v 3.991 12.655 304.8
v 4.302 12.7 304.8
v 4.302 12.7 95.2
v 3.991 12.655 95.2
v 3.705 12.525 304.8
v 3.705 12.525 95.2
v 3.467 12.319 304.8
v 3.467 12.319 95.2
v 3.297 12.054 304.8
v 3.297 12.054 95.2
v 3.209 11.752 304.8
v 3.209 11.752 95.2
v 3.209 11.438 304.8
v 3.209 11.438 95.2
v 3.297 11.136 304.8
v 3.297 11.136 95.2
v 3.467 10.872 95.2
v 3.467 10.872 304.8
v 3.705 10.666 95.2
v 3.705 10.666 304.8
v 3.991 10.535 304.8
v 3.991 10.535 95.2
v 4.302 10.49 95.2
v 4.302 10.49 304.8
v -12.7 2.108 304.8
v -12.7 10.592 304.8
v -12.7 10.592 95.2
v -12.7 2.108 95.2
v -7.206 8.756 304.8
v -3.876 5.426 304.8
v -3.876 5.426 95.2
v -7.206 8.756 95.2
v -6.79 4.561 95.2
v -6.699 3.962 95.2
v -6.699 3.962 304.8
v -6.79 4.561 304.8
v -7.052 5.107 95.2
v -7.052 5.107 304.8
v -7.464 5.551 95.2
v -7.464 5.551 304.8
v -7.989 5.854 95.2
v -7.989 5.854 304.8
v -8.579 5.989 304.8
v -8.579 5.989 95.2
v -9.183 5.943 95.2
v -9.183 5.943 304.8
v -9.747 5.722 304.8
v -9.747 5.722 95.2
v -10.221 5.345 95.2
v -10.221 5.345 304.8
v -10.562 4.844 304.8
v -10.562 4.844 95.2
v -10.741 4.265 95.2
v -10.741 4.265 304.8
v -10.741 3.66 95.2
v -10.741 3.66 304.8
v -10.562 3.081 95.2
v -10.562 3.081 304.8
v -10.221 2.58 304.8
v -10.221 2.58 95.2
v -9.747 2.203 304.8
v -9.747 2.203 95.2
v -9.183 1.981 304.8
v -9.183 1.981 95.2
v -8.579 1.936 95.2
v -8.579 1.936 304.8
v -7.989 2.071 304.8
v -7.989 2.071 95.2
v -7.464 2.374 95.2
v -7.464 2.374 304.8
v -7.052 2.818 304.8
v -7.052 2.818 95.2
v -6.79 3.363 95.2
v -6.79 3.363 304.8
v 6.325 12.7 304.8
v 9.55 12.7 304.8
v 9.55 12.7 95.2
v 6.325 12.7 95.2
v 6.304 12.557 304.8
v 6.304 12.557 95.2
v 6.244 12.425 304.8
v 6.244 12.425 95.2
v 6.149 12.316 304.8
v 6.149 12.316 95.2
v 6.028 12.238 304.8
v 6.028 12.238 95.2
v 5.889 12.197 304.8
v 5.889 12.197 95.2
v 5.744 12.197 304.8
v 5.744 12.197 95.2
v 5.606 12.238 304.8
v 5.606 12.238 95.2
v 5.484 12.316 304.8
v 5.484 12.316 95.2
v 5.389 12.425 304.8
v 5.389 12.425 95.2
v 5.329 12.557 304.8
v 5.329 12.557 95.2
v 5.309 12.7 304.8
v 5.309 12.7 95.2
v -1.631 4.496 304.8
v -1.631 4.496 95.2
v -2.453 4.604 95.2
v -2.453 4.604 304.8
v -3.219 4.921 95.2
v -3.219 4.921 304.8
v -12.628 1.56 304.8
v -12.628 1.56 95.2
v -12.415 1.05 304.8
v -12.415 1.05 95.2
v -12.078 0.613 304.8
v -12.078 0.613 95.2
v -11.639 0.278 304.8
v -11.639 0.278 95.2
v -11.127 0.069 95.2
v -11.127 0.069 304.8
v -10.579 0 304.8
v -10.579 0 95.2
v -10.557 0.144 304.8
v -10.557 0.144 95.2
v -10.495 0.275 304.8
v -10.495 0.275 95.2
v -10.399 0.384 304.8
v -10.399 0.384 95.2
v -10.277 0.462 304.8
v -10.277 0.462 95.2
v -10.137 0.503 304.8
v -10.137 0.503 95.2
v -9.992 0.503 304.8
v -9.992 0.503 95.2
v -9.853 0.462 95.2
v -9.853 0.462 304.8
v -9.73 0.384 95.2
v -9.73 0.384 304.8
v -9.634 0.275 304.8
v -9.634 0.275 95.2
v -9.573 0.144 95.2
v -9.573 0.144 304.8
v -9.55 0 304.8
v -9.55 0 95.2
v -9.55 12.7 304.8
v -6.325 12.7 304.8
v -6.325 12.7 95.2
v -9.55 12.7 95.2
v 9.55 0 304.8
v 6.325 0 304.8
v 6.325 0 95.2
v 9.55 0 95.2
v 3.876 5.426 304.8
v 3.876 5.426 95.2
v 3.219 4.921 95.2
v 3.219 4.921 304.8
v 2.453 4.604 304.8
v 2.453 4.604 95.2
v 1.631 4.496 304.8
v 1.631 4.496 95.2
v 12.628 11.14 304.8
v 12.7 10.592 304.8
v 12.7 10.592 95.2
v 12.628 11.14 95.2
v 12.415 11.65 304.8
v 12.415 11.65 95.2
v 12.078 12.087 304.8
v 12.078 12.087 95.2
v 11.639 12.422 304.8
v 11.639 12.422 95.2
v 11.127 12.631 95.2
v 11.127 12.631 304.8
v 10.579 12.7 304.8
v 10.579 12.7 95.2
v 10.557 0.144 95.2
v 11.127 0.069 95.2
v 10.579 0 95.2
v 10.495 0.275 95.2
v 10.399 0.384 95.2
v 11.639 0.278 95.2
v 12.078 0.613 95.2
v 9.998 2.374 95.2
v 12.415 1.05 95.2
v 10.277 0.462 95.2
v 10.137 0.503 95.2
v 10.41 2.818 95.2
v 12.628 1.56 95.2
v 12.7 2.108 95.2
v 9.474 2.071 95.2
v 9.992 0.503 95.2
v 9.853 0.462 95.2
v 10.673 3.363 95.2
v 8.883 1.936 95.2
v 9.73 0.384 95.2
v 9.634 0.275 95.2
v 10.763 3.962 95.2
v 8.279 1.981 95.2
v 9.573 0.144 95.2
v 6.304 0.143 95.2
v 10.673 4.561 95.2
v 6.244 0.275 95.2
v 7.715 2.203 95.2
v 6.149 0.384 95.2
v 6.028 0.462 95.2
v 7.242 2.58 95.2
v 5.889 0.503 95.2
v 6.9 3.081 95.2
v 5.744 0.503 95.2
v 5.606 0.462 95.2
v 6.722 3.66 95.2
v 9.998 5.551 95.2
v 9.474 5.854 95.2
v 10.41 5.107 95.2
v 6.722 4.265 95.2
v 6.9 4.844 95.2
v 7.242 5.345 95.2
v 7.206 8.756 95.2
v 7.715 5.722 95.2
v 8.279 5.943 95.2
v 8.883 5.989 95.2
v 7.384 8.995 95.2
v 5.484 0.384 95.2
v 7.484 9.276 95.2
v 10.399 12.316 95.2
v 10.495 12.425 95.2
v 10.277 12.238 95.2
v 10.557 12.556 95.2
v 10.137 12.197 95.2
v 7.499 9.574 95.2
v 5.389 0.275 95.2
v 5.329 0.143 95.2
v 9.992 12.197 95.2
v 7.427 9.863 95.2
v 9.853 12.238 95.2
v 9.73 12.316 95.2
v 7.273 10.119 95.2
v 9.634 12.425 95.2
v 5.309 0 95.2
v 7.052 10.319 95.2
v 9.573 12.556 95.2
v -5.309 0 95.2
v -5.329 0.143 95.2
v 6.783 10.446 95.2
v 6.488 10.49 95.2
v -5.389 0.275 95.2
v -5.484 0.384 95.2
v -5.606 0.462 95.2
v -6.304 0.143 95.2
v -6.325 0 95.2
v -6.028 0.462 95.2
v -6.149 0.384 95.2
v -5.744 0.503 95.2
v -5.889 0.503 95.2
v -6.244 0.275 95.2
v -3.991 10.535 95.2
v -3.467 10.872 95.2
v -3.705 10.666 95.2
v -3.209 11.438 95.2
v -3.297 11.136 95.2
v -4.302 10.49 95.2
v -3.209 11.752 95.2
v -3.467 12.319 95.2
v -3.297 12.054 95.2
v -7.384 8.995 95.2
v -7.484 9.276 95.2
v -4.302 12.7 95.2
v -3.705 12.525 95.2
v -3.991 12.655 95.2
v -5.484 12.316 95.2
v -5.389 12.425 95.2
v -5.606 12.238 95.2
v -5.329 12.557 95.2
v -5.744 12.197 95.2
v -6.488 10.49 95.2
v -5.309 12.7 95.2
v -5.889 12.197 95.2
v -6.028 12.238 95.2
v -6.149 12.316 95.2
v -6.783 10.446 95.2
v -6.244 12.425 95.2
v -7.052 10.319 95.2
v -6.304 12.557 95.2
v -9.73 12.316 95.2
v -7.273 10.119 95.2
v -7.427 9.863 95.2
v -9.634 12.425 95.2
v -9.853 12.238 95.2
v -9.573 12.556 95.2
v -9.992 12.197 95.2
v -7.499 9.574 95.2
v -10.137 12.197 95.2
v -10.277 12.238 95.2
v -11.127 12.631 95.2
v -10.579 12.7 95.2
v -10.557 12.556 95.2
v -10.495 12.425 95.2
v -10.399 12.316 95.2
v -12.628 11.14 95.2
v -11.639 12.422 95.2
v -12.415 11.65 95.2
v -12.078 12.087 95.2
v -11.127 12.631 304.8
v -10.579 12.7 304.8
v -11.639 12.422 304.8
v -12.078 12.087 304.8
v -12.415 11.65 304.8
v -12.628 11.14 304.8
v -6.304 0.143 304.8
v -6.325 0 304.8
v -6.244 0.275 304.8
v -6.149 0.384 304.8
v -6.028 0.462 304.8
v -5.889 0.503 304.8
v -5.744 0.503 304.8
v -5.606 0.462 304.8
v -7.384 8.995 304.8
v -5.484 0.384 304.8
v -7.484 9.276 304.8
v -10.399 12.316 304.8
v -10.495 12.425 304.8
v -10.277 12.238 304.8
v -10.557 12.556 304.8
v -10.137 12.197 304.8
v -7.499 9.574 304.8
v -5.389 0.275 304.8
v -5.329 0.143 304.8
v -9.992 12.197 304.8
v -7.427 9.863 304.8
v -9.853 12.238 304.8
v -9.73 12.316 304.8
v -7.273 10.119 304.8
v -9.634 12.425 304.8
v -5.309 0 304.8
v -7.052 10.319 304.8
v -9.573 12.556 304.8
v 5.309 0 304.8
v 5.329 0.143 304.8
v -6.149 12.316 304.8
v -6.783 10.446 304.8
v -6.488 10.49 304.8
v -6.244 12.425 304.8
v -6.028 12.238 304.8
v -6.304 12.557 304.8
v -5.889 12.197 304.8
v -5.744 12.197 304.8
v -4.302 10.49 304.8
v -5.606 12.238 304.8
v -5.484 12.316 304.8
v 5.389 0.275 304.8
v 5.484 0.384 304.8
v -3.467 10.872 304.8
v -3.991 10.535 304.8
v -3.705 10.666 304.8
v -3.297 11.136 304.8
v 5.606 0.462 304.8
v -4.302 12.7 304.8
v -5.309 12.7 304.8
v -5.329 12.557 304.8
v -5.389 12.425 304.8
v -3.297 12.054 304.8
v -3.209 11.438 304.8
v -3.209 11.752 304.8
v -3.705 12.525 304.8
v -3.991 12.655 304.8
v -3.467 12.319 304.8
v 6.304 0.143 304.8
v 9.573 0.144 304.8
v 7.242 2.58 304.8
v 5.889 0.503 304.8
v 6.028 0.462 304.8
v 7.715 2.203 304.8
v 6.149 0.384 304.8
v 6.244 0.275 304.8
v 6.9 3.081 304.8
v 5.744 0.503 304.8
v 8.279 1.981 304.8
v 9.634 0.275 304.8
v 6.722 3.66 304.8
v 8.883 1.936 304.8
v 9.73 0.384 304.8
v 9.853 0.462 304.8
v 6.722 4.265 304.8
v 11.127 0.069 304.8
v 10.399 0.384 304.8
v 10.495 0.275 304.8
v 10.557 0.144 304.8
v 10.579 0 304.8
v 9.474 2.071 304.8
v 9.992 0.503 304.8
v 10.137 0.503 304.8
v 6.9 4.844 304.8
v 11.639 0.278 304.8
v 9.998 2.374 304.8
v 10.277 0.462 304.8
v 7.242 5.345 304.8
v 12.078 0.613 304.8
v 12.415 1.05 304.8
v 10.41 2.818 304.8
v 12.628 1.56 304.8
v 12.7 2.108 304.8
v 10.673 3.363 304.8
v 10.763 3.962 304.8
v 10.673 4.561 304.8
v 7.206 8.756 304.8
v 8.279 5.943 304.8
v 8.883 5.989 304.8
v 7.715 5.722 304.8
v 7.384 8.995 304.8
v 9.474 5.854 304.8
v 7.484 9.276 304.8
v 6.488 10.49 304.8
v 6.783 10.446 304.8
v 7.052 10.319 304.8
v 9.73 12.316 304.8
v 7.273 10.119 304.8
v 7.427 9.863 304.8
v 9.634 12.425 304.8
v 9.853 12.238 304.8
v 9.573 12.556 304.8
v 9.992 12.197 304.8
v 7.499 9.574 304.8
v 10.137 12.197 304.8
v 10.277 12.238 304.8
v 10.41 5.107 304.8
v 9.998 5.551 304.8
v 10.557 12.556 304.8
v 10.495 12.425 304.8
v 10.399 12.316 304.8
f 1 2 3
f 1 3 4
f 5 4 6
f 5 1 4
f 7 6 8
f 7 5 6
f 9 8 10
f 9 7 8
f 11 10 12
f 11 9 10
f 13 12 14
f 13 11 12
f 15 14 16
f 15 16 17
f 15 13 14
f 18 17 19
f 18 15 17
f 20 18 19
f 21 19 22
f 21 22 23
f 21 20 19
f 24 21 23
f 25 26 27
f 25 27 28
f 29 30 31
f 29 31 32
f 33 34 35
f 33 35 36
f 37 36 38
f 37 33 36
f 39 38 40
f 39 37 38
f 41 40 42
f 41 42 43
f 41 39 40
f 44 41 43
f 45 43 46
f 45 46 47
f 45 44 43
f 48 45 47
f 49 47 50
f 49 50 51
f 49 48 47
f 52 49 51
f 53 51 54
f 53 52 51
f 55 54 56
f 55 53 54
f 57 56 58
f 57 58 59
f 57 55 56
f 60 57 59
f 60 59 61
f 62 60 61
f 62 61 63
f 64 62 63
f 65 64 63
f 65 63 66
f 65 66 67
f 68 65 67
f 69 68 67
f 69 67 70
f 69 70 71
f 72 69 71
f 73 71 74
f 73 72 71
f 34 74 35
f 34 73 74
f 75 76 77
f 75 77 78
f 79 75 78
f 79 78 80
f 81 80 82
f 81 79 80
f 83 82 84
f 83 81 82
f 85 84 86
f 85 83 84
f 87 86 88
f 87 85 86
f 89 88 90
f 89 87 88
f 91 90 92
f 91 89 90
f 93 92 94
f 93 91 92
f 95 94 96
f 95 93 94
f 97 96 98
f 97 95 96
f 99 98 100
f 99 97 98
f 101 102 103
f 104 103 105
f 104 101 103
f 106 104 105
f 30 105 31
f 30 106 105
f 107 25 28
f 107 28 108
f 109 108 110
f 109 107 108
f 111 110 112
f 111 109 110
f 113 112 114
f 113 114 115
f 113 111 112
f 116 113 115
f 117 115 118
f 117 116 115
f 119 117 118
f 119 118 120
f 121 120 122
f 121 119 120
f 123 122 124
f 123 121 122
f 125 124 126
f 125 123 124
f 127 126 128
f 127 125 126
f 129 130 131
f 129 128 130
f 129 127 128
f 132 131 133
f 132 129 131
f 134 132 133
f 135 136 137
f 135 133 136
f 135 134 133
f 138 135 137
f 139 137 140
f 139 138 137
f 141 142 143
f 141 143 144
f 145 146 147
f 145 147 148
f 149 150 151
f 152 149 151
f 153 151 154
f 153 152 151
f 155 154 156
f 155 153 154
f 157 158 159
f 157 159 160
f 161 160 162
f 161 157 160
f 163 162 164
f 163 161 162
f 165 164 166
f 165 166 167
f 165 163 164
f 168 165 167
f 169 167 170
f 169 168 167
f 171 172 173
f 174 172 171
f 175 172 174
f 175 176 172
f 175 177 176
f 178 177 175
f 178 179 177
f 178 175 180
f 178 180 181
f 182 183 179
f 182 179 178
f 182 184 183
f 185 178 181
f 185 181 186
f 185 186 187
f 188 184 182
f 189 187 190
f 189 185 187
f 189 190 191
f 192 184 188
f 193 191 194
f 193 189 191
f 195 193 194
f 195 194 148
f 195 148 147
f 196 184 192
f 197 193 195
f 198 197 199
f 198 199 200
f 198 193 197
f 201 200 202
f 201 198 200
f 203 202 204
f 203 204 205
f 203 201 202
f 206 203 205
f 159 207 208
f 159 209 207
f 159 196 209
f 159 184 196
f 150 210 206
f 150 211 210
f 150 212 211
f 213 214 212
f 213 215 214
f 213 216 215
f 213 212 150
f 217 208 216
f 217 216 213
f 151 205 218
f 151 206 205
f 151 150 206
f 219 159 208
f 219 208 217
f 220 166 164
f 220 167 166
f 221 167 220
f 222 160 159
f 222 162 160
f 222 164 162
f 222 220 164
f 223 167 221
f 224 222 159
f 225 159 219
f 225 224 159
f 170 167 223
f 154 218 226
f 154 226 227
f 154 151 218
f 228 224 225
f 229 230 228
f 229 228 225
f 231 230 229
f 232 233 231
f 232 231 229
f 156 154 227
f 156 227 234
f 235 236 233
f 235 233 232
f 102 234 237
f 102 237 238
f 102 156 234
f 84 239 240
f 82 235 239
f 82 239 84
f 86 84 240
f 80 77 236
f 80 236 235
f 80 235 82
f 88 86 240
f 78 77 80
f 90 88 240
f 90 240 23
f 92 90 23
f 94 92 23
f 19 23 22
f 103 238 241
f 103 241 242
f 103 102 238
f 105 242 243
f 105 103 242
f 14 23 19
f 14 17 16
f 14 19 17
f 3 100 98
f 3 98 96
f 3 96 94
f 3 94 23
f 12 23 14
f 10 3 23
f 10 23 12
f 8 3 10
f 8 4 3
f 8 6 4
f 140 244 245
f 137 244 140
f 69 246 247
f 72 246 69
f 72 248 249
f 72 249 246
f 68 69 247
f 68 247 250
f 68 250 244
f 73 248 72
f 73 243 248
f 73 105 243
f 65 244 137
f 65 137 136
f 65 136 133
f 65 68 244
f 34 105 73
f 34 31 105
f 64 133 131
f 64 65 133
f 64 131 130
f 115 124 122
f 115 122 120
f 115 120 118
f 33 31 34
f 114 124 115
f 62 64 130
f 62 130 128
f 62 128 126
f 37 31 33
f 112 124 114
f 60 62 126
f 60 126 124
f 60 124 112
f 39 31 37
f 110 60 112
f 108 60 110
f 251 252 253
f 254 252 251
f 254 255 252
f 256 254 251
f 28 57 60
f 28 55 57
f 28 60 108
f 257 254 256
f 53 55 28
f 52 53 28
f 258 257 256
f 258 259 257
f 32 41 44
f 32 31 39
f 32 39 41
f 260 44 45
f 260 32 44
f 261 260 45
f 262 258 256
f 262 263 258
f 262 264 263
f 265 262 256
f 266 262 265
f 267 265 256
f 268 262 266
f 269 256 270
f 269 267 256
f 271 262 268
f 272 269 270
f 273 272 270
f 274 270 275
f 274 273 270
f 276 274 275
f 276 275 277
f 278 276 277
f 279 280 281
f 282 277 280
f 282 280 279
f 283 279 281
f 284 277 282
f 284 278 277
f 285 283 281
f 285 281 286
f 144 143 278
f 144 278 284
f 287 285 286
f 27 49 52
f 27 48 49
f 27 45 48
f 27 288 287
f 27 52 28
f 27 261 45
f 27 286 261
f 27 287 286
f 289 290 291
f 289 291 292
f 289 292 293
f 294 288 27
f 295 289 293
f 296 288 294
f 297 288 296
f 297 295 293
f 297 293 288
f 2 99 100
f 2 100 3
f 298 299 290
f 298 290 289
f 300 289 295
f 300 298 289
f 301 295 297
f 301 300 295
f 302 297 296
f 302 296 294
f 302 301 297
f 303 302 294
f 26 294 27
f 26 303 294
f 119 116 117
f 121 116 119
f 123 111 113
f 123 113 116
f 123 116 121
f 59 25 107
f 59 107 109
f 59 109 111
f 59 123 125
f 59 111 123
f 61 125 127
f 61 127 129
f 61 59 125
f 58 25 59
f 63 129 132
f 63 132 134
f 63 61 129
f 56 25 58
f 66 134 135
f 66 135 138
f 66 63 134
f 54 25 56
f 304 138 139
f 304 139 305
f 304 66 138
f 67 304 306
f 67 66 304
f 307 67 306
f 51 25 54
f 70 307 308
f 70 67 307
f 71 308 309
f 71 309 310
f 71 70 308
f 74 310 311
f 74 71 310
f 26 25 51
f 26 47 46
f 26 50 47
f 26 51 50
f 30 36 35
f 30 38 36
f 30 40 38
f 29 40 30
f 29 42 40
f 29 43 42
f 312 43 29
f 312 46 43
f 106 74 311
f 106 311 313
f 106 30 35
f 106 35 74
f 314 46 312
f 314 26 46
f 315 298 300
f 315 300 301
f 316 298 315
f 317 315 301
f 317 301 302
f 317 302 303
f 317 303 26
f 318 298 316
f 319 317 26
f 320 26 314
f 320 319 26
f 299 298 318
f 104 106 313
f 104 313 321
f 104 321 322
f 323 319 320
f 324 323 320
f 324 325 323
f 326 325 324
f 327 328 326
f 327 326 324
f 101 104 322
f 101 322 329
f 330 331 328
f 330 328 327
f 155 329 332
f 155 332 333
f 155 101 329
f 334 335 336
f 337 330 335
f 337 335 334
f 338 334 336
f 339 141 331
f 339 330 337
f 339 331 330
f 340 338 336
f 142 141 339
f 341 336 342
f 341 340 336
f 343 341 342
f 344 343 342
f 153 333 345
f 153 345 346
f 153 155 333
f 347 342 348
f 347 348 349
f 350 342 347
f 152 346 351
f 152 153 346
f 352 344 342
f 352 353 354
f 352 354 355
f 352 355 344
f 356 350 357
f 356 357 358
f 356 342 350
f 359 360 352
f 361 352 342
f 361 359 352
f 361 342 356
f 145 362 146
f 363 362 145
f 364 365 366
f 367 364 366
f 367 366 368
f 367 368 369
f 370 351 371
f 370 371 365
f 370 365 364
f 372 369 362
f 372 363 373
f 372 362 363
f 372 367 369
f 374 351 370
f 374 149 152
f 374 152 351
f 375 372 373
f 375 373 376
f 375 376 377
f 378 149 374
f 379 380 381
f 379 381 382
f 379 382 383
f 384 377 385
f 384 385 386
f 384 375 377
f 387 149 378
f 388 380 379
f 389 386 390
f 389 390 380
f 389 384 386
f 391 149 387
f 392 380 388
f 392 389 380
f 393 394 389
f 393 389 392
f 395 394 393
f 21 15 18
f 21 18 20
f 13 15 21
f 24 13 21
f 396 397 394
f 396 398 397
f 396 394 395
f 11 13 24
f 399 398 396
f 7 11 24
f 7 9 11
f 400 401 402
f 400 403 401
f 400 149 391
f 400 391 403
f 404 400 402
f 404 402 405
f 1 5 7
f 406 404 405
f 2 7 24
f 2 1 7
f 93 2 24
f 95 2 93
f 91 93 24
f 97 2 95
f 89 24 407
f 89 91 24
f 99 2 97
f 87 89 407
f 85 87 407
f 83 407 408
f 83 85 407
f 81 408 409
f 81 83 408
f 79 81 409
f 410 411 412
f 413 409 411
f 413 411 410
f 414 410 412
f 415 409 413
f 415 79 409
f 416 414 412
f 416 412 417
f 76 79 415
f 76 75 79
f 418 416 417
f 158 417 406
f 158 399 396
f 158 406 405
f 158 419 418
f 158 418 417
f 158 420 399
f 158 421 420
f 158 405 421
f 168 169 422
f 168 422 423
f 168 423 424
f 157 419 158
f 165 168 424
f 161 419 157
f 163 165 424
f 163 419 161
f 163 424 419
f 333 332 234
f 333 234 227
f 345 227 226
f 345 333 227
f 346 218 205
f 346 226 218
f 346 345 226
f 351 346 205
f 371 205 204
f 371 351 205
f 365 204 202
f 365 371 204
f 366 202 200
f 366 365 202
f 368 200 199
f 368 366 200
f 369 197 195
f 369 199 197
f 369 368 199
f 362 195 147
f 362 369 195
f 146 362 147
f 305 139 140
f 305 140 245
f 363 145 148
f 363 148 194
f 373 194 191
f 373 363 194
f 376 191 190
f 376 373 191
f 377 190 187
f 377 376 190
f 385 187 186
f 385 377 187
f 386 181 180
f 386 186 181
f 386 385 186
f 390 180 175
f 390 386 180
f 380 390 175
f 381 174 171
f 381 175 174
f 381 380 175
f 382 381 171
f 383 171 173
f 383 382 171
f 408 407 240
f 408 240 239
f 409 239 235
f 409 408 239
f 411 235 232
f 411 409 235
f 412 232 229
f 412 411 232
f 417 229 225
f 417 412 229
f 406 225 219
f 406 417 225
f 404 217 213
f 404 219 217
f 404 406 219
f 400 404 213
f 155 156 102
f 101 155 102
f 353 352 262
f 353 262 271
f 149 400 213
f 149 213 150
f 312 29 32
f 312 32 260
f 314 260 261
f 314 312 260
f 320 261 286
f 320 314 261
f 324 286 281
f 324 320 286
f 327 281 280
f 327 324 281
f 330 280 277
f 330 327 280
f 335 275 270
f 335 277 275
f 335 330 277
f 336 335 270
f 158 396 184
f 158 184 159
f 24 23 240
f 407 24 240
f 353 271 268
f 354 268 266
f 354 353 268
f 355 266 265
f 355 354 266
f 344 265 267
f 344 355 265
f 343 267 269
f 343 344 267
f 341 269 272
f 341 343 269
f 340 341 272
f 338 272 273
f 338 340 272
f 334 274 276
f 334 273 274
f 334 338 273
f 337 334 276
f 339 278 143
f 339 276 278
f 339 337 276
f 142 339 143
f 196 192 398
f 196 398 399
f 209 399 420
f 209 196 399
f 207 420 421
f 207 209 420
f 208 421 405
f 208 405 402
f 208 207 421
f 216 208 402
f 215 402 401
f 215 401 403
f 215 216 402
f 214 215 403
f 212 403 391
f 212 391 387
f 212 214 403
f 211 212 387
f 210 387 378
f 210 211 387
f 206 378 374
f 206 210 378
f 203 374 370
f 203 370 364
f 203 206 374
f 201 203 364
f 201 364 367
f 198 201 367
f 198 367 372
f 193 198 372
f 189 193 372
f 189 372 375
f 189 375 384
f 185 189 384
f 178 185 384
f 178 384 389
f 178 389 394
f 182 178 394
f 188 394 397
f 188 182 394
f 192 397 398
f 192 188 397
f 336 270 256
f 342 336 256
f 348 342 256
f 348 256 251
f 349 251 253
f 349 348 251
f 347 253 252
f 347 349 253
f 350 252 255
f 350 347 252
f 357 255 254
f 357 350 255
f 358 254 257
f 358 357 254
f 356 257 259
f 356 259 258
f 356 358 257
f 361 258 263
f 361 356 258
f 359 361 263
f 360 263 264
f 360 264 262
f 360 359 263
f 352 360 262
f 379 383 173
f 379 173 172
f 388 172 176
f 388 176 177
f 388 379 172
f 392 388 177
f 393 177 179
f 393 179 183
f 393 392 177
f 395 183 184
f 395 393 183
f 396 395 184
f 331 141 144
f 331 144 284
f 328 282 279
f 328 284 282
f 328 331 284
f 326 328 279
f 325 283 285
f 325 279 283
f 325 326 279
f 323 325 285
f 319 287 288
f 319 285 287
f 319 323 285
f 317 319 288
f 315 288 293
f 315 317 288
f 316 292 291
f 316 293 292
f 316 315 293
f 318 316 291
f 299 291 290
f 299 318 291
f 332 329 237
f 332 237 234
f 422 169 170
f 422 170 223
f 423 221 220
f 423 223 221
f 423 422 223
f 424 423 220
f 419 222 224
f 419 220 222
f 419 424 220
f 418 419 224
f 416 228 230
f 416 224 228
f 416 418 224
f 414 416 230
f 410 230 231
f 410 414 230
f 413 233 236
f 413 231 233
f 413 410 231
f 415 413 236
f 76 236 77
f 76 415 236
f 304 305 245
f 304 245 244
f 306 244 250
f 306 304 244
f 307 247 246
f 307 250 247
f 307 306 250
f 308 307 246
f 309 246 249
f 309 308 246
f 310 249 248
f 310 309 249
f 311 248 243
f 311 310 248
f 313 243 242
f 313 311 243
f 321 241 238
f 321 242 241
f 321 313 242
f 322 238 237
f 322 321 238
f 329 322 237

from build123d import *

# Parameters (mm, degrees)
SKETCH1_R           = 2.032
BOSS_EXTRUDE1_DEPTH = 304.8
SKETCH2_W           = 42.88308167
SKETCH2_H           = 34.457496419
CUT_EXTRUDE1_DEPTH  = 400


with BuildPart() as part:
    # Sketch1 → Boss-Extrude1 (new body, symmetric)
    with BuildSketch(Plane.XY):
        with BuildLine():
            Line((-12.7, 10.591838253), (-12.7, 2.108161747))
            ThreePointArc((-12.7, 2.108161747), (-12.078025605, 0.612955845), (-10.5791, 0))
            ThreePointArc((-10.5791, 0), (-10.06475, 0.508039196), (-9.5504, 0))
            Line((-9.5504, 0), (-6.3246, 0))
            ThreePointArc((-6.3246, 0), (-5.8166, 0.508), (-5.3086, 0))
            Line((-5.3086, 0), (5.3086, 0))
            ThreePointArc((5.3086, 0), (5.8166, 0.508), (6.3246, 0))
            Line((6.3246, 0), (9.5504, 0))
            ThreePointArc((9.5504, 0), (10.06475, 0.508039196), (10.5791, 0))
            ThreePointArc((10.5791, 0), (12.078025605, 0.612955845), (12.7, 2.108161747))
            Line((12.7, 2.108161747), (12.7, 10.591838253))
            ThreePointArc((12.7, 10.591838253), (12.078025605, 12.087044155), (10.5791, 12.7))
            ThreePointArc((10.5791, 12.7), (10.06475, 12.191960804), (9.5504, 12.7))
            Line((9.5504, 12.7), (6.3246, 12.7))
            ThreePointArc((6.3246, 12.7), (5.816599999, 12.191999983), (5.3086, 12.700000002))
            Line((5.3086, 12.700000002), (4.302307889, 12.700000002))
            ThreePointArc((4.302307889, 12.700000002), (3.197407889, 11.595100002), (4.302307889, 10.490200002))
            Line((4.302307889, 10.490200002), (6.487959021, 10.490200002))
            ThreePointArc((6.487959021, 10.490200002), (7.426620626, 9.863006369), (7.20637951, 8.755779512))
            Line((7.20637951, 8.755779512), (3.87633597, 5.425735971))
            ThreePointArc((3.87633597, 5.425735971), (2.846291837, 4.737482486), (1.631271939, 4.495800002))
            Line((1.631271939, 4.495800002), (-1.631271939, 4.495800002))
            ThreePointArc((-1.631271939, 4.495800002), (-2.846291837, 4.737482486), (-3.87633597, 5.425735971))
            Line((-3.87633597, 5.425735971), (-7.20637951, 8.755779512))
            ThreePointArc((-7.20637951, 8.755779512), (-7.426620626, 9.863006369), (-6.487959021, 10.490200002))
            Line((-6.487959021, 10.490200002), (-4.302307889, 10.490200002))
            ThreePointArc((-4.302307889, 10.490200002), (-3.197407889, 11.595100002), (-4.302307889, 12.700000002))
            Line((-4.302307889, 12.700000002), (-5.3086, 12.700000002))
            ThreePointArc((-5.3086, 12.700000002), (-5.816599999, 12.191999985), (-6.3246, 12.7))
            Line((-6.3246, 12.7), (-9.5504, 12.7))
            ThreePointArc((-9.5504, 12.7), (-10.06475, 12.191960804), (-10.5791, 12.7))
            ThreePointArc((-10.5791, 12.7), (-12.078025605, 12.087044155), (-12.7, 10.591838253))
        make_face()
        with Locations((-8.73125, 3.9624)):
            Circle(SKETCH1_R, mode=Mode.SUBTRACT)
        with Locations((8.73125, 3.9624)):
            Circle(SKETCH1_R, mode=Mode.SUBTRACT)
    extrude(amount=BOSS_EXTRUDE1_DEPTH, both=True)

    # Sketch2 → Cut-Extrude1 (cut)
    with BuildSketch(Plane(origin=(0, 0, -304.8), x_dir=(-1, 0, 0), z_dir=(0, 0, -1))):
        with Locations((2.724035754, 4.894294136)):
            Rectangle(SKETCH2_W, SKETCH2_H)
    extrude(amount=-CUT_EXTRUDE1_DEPTH, mode=Mode.SUBTRACT)


solid = part.part
